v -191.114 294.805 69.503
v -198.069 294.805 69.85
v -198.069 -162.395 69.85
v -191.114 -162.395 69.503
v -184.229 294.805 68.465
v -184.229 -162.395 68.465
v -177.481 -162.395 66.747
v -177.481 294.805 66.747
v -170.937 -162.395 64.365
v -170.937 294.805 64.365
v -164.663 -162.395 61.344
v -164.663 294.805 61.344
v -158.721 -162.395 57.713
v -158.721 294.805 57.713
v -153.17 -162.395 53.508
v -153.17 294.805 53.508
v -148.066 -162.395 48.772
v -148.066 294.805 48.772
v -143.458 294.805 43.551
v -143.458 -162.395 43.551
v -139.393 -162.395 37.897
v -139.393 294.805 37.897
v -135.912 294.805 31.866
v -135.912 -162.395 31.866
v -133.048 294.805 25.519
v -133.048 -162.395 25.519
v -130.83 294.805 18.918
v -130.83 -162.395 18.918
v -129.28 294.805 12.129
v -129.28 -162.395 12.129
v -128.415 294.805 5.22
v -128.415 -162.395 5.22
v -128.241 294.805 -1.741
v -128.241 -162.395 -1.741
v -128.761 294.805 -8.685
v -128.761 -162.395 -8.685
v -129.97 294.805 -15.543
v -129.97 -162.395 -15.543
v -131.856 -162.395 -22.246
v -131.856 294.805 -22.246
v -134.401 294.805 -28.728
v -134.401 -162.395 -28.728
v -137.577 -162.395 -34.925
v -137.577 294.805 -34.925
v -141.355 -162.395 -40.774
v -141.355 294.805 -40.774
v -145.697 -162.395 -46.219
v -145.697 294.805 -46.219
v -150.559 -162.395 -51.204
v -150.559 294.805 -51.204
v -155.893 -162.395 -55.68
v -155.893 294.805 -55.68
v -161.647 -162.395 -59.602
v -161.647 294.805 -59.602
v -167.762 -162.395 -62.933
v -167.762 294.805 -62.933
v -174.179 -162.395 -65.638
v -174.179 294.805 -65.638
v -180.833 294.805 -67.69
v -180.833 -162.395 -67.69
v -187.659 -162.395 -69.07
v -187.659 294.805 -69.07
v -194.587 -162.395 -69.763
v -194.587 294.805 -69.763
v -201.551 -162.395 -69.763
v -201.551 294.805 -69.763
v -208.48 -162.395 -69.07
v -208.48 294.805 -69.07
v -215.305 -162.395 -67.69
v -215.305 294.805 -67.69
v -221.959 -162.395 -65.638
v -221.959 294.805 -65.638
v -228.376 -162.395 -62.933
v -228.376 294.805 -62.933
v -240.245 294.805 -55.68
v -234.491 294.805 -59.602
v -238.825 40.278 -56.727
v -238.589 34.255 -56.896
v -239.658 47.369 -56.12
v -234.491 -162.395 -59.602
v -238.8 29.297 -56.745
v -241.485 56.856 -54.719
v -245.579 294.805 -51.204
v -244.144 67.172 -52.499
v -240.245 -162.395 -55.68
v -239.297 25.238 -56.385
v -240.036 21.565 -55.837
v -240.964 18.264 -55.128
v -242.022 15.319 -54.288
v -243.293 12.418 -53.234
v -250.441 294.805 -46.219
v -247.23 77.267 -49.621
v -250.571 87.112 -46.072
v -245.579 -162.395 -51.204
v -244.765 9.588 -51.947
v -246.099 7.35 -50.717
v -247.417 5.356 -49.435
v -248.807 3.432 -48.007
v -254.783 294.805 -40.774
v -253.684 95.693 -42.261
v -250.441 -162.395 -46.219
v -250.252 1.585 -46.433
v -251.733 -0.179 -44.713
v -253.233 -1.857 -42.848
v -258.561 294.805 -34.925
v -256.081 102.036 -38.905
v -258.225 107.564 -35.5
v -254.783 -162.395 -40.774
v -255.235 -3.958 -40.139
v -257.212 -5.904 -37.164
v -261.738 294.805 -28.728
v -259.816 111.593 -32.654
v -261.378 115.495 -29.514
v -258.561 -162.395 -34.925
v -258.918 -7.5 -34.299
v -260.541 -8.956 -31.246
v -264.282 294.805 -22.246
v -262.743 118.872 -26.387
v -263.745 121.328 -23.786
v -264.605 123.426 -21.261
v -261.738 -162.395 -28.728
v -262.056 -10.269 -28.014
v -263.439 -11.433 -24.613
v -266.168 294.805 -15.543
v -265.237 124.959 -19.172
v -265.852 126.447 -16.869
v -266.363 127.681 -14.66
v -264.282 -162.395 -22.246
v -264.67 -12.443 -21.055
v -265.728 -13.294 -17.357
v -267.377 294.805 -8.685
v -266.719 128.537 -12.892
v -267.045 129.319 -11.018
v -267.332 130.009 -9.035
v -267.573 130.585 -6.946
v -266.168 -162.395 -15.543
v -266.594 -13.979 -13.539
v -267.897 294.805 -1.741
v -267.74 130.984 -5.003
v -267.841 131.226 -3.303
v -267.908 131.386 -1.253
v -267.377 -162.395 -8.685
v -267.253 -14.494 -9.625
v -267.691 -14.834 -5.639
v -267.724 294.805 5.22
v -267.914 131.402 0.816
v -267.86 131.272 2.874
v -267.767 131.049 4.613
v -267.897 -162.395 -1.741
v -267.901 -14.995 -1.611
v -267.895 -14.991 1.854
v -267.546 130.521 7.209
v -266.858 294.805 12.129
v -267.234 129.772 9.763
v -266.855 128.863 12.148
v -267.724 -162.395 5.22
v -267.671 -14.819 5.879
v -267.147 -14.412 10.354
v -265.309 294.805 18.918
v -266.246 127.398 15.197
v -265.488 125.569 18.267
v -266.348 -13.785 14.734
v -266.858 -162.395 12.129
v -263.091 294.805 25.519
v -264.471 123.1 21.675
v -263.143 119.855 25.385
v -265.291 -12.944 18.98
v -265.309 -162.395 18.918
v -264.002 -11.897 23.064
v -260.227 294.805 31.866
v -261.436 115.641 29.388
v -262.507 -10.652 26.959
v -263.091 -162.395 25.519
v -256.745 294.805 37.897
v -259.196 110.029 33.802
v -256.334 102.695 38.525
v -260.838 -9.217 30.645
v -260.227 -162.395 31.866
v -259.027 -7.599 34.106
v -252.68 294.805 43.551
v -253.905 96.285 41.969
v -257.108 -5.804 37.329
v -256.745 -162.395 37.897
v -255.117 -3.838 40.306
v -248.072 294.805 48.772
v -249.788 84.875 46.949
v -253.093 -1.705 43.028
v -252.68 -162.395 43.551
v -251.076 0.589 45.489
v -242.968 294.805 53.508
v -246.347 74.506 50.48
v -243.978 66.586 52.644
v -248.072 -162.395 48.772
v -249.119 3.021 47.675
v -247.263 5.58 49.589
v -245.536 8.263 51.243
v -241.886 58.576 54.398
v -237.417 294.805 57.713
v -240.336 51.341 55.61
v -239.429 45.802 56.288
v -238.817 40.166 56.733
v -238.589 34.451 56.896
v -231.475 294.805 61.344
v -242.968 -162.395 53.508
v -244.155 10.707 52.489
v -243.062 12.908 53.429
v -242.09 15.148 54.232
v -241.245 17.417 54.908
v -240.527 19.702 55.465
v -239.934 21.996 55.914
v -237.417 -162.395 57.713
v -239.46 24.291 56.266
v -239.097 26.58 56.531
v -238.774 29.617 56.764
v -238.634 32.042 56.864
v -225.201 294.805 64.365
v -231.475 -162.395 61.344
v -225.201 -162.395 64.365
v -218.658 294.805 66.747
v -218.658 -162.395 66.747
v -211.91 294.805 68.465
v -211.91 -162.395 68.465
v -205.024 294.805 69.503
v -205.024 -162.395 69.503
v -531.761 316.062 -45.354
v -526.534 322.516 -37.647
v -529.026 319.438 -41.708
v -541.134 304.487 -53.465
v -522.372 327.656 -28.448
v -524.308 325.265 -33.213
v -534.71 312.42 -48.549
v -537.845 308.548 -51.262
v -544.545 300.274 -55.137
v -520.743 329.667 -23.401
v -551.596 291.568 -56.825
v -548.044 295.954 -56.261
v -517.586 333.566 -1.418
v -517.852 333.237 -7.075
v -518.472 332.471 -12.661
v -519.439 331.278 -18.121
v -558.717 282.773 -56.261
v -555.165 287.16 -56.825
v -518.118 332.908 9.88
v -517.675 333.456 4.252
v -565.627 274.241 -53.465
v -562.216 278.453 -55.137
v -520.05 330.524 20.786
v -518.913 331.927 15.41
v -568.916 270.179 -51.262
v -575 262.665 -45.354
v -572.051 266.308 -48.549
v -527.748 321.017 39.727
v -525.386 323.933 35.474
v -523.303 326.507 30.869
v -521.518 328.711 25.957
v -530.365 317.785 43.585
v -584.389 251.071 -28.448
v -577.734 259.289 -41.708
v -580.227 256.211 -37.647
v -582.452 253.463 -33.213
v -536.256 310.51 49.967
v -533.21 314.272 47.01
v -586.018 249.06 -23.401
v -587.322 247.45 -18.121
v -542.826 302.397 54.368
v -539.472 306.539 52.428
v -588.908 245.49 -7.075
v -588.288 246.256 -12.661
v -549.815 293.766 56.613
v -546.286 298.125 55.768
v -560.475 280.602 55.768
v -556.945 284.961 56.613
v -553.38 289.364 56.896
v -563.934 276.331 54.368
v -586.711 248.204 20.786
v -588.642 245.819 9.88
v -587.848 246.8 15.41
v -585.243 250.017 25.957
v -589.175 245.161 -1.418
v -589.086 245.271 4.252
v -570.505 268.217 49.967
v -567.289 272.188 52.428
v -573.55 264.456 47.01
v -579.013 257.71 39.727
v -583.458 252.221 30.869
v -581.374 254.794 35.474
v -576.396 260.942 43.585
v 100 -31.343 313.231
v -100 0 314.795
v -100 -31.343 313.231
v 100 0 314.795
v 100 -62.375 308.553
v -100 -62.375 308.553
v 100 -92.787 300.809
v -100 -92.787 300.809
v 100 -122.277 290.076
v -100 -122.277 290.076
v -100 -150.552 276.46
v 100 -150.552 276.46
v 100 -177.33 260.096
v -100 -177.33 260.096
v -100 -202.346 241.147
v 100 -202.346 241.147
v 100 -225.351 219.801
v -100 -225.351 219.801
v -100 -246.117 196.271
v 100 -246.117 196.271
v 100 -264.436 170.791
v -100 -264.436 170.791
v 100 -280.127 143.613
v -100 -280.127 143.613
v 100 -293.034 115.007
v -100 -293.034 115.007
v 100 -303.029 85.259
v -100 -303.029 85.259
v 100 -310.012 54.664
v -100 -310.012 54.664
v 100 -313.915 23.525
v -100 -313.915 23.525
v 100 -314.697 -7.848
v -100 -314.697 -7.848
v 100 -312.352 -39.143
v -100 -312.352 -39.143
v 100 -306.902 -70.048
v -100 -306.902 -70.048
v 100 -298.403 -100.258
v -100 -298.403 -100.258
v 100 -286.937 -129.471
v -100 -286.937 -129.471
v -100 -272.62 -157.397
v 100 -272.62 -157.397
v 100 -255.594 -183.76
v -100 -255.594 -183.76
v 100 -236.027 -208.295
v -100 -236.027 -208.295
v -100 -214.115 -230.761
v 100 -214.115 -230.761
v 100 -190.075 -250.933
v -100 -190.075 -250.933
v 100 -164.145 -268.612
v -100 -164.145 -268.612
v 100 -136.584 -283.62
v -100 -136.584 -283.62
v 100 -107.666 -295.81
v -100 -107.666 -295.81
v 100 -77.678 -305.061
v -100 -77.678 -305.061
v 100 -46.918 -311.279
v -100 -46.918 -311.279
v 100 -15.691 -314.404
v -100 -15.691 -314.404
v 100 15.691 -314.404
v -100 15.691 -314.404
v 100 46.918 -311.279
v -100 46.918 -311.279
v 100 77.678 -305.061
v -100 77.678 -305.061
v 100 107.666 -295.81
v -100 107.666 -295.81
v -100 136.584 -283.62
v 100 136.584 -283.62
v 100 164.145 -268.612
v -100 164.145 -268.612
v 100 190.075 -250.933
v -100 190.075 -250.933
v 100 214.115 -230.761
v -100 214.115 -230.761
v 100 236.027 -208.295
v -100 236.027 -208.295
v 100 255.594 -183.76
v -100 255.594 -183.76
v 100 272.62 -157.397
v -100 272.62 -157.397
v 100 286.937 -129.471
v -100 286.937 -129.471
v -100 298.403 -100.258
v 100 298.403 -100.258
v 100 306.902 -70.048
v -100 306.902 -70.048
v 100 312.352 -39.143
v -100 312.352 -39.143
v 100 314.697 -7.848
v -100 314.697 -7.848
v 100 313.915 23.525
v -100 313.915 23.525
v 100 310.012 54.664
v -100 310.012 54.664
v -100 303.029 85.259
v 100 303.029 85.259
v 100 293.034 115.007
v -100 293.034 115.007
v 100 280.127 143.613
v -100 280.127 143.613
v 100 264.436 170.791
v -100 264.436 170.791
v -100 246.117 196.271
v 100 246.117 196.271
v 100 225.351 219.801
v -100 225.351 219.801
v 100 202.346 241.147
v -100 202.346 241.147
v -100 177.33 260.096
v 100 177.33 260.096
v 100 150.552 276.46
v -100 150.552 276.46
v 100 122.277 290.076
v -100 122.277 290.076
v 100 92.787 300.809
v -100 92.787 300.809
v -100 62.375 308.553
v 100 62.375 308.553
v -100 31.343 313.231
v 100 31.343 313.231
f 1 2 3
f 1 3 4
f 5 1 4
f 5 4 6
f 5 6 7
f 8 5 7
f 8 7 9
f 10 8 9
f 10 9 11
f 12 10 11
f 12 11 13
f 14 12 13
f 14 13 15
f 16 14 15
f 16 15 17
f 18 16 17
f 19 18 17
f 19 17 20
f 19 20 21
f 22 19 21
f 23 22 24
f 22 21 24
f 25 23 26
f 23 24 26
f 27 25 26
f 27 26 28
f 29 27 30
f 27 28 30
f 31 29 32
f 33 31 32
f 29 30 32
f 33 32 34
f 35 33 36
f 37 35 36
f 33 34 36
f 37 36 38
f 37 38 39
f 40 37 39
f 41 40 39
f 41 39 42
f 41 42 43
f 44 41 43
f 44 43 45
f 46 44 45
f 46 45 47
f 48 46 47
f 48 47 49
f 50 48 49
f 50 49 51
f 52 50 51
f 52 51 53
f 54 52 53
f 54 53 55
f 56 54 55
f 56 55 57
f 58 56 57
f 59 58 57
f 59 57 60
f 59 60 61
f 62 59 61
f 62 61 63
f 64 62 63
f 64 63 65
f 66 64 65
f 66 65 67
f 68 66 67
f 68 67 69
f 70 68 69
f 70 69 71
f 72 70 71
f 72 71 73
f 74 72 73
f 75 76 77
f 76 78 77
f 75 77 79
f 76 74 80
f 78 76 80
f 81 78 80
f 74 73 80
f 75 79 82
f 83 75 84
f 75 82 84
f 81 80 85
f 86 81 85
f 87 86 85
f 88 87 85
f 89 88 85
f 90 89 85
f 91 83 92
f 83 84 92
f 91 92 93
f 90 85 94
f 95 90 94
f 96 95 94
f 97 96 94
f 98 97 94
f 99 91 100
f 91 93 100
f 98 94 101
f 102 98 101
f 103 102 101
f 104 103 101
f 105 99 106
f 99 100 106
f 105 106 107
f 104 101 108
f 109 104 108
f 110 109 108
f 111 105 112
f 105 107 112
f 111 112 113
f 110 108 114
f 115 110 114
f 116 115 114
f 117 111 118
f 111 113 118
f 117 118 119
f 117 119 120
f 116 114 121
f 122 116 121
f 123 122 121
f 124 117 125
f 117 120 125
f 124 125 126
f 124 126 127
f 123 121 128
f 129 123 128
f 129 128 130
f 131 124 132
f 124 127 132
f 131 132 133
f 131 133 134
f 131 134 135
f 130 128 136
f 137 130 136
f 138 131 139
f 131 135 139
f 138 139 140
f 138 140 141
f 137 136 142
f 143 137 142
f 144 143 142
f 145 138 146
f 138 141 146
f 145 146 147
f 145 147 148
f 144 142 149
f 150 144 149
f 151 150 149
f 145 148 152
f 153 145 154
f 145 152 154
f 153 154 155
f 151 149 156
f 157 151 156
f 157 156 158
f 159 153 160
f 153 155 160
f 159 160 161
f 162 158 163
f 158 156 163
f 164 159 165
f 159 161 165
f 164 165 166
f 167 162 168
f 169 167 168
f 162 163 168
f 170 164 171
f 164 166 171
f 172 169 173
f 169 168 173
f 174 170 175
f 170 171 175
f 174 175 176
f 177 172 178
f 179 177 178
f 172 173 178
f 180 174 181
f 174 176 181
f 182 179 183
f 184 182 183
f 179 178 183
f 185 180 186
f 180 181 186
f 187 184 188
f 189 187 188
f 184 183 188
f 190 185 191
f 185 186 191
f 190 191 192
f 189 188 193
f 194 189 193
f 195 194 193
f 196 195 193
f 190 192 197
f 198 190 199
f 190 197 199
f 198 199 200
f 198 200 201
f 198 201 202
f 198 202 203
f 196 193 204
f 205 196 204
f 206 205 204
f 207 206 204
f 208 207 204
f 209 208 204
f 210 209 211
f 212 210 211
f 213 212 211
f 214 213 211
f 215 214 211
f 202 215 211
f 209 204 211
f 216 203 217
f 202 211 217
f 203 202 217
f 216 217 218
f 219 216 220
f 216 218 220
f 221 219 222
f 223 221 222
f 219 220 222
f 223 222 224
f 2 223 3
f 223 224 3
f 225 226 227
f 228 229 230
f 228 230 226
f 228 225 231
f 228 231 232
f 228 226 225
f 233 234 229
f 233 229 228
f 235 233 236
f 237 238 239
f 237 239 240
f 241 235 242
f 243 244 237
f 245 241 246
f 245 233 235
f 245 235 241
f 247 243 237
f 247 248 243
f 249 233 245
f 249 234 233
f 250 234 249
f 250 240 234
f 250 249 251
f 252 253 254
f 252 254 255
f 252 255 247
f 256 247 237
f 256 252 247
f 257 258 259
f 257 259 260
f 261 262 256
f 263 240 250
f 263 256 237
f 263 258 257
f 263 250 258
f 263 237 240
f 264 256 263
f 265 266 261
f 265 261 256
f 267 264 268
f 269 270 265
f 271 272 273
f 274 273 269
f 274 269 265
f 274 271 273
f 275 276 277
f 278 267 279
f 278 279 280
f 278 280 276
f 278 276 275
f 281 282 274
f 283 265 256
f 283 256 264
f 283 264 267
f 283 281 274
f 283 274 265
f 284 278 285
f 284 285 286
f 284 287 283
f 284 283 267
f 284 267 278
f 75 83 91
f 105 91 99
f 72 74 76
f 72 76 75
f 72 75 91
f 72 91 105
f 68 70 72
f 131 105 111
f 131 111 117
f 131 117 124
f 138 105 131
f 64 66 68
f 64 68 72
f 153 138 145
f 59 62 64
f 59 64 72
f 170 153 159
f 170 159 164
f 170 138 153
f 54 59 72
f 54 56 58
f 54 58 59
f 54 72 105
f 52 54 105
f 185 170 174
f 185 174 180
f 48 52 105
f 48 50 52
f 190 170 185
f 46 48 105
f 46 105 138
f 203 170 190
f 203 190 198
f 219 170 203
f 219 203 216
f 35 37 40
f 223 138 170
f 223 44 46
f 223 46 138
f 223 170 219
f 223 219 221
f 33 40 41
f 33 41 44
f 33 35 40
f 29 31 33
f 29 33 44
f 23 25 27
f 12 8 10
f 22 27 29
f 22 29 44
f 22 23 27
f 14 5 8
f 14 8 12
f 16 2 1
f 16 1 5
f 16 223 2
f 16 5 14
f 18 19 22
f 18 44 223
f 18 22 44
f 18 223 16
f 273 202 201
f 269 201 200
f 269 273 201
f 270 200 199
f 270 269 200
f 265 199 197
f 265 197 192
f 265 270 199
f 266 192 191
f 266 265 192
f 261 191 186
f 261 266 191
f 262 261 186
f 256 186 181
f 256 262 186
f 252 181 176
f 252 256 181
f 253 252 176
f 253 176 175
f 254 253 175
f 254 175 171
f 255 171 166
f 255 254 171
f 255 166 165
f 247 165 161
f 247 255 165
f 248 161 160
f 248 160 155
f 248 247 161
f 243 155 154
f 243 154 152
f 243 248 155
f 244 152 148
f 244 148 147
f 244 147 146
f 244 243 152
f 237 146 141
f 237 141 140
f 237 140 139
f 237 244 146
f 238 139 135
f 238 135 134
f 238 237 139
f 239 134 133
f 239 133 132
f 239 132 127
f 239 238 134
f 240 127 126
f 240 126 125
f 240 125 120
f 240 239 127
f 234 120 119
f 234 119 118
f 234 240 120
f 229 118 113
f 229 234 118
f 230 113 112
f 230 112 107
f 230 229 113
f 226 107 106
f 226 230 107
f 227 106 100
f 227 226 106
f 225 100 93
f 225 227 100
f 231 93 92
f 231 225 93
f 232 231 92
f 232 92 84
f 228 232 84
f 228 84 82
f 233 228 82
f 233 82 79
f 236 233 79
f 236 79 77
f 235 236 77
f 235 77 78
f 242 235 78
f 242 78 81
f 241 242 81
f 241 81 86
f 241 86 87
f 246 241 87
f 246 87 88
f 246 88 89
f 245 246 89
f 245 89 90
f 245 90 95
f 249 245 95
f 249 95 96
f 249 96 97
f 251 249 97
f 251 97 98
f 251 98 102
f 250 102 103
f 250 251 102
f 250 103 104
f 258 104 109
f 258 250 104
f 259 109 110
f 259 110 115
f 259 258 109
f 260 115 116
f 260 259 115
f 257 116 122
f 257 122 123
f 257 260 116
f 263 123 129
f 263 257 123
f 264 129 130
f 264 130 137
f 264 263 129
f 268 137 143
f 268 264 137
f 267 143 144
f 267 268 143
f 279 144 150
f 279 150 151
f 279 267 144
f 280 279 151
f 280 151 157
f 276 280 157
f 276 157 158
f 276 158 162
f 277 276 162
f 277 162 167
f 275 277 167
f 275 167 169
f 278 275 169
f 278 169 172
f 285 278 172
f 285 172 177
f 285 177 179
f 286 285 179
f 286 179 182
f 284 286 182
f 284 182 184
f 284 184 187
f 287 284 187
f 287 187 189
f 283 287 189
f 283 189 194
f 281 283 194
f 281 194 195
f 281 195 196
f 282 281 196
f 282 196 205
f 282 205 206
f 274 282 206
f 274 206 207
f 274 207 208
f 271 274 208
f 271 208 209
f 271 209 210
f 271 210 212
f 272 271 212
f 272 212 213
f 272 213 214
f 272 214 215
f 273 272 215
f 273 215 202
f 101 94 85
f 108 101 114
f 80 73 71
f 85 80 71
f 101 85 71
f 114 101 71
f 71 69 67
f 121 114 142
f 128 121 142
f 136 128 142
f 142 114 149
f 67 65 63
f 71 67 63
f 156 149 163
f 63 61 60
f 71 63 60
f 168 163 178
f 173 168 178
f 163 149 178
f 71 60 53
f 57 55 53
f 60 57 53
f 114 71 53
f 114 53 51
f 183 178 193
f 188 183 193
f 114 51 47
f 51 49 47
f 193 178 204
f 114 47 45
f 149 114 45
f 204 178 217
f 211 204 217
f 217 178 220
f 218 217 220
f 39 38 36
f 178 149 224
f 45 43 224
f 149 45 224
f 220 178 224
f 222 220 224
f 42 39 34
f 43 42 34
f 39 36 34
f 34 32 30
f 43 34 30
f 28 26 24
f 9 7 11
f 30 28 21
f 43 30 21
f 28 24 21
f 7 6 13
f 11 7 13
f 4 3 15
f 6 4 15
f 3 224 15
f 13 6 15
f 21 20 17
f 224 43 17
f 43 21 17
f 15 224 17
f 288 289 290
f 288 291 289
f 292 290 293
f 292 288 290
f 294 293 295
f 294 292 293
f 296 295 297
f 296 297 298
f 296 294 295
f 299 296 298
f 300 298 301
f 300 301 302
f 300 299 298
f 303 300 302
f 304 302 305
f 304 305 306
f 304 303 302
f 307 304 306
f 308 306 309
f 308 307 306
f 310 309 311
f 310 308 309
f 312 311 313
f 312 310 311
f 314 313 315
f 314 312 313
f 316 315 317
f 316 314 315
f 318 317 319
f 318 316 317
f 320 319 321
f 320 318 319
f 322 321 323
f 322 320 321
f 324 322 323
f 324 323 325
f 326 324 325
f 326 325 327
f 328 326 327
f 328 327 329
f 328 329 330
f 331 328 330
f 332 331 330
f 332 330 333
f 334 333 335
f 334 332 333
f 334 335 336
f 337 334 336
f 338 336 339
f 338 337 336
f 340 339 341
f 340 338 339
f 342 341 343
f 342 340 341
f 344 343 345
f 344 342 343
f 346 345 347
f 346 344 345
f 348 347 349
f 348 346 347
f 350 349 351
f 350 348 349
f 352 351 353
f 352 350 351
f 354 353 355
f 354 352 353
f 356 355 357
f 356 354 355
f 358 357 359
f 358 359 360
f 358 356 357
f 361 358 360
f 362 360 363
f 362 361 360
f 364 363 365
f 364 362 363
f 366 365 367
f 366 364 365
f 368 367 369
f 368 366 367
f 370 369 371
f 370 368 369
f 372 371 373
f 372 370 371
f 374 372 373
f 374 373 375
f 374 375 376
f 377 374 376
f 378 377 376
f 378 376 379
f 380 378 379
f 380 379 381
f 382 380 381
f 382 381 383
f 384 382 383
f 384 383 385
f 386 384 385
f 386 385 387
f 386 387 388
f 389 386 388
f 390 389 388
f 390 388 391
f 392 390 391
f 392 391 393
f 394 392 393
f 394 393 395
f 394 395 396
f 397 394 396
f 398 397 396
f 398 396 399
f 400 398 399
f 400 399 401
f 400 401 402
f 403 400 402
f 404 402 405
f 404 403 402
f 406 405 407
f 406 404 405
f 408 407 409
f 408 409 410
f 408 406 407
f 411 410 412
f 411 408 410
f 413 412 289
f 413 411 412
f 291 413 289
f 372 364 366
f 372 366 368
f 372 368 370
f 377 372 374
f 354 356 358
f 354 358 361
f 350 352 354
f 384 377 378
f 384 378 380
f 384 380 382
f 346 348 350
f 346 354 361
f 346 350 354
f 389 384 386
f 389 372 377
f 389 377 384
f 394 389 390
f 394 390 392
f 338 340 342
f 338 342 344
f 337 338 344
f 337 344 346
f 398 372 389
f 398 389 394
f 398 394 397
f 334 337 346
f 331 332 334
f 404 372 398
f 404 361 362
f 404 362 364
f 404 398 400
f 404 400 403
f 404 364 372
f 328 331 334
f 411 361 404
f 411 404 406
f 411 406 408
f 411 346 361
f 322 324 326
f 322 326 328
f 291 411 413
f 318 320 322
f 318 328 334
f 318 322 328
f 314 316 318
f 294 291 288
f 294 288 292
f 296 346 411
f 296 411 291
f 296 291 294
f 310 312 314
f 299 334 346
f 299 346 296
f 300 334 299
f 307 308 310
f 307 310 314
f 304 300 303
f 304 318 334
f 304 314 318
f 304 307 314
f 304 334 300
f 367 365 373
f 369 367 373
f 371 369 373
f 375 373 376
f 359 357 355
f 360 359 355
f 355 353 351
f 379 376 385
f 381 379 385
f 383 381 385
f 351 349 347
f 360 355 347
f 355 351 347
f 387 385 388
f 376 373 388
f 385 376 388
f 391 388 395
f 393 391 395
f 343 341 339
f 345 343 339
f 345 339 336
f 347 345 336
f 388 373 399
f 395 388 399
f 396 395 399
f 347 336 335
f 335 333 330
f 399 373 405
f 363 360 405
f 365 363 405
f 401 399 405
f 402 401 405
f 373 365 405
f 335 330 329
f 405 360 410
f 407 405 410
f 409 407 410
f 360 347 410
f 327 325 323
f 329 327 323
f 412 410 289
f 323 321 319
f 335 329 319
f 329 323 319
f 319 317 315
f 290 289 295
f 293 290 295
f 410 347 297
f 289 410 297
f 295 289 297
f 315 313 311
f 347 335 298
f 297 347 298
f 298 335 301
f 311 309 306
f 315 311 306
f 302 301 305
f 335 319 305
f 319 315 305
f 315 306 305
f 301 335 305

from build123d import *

# Parameters (mm, degrees)
SKETCH1_R           = 314.7949
BOSS_EXTRUDE1_DEPTH = 99.9998
BOSS_EXTRUDE2_START = 152.4
SKETCH2_R           = 69.85
BOSS_EXTRUDE2_DEPTH = 457.2
SKETCH4_R           = 56.896


with BuildPart() as part:
    # Sketch1 → Boss-Extrude1 (new, symmetric)
    with BuildSketch(Plane(origin=(0, 0, 0), x_dir=(0, 0, -1), z_dir=(1, 0, 0))):
        with Locations(Location((0, 0, 0), (0, 0, 180))):
            Circle(SKETCH1_R)
    extrude(amount=BOSS_EXTRUDE1_DEPTH, both=True)


with BuildPart() as body_2:
    # Sketch2 → Boss-Extrude2 (new body)
    with BuildSketch(Plane(origin=(0, -314.7949, 0), x_dir=(1, 0, 0), z_dir=(0, 1, 0)).offset(BOSS_EXTRUDE2_START)):
        with Locations(Location((-198.0692, 0, 0), (0, 0, 270))):
            Circle(SKETCH2_R)
    extrude(amount=BOSS_EXTRUDE2_DEPTH)

    # Sweep1: sweep along a path in Sketch3
    with BuildLine(Plane.XY) as sweep1_path:
        Line((-198.0692, 1.6383), (-553.380333578, 289.363582788))
    # Sketch4 → Sweep1 (sweep)
    with BuildSketch(Plane(origin=(-553.380333578, 289.363582788, 0), x_dir=(0, 0, 1), z_dir=(-0.7771459614569677, 0.6293203910498415, 0))):
        Circle(SKETCH4_R)
    sweep(path=sweep1_path.line)


solid = Compound([part.part, body_2.part])
